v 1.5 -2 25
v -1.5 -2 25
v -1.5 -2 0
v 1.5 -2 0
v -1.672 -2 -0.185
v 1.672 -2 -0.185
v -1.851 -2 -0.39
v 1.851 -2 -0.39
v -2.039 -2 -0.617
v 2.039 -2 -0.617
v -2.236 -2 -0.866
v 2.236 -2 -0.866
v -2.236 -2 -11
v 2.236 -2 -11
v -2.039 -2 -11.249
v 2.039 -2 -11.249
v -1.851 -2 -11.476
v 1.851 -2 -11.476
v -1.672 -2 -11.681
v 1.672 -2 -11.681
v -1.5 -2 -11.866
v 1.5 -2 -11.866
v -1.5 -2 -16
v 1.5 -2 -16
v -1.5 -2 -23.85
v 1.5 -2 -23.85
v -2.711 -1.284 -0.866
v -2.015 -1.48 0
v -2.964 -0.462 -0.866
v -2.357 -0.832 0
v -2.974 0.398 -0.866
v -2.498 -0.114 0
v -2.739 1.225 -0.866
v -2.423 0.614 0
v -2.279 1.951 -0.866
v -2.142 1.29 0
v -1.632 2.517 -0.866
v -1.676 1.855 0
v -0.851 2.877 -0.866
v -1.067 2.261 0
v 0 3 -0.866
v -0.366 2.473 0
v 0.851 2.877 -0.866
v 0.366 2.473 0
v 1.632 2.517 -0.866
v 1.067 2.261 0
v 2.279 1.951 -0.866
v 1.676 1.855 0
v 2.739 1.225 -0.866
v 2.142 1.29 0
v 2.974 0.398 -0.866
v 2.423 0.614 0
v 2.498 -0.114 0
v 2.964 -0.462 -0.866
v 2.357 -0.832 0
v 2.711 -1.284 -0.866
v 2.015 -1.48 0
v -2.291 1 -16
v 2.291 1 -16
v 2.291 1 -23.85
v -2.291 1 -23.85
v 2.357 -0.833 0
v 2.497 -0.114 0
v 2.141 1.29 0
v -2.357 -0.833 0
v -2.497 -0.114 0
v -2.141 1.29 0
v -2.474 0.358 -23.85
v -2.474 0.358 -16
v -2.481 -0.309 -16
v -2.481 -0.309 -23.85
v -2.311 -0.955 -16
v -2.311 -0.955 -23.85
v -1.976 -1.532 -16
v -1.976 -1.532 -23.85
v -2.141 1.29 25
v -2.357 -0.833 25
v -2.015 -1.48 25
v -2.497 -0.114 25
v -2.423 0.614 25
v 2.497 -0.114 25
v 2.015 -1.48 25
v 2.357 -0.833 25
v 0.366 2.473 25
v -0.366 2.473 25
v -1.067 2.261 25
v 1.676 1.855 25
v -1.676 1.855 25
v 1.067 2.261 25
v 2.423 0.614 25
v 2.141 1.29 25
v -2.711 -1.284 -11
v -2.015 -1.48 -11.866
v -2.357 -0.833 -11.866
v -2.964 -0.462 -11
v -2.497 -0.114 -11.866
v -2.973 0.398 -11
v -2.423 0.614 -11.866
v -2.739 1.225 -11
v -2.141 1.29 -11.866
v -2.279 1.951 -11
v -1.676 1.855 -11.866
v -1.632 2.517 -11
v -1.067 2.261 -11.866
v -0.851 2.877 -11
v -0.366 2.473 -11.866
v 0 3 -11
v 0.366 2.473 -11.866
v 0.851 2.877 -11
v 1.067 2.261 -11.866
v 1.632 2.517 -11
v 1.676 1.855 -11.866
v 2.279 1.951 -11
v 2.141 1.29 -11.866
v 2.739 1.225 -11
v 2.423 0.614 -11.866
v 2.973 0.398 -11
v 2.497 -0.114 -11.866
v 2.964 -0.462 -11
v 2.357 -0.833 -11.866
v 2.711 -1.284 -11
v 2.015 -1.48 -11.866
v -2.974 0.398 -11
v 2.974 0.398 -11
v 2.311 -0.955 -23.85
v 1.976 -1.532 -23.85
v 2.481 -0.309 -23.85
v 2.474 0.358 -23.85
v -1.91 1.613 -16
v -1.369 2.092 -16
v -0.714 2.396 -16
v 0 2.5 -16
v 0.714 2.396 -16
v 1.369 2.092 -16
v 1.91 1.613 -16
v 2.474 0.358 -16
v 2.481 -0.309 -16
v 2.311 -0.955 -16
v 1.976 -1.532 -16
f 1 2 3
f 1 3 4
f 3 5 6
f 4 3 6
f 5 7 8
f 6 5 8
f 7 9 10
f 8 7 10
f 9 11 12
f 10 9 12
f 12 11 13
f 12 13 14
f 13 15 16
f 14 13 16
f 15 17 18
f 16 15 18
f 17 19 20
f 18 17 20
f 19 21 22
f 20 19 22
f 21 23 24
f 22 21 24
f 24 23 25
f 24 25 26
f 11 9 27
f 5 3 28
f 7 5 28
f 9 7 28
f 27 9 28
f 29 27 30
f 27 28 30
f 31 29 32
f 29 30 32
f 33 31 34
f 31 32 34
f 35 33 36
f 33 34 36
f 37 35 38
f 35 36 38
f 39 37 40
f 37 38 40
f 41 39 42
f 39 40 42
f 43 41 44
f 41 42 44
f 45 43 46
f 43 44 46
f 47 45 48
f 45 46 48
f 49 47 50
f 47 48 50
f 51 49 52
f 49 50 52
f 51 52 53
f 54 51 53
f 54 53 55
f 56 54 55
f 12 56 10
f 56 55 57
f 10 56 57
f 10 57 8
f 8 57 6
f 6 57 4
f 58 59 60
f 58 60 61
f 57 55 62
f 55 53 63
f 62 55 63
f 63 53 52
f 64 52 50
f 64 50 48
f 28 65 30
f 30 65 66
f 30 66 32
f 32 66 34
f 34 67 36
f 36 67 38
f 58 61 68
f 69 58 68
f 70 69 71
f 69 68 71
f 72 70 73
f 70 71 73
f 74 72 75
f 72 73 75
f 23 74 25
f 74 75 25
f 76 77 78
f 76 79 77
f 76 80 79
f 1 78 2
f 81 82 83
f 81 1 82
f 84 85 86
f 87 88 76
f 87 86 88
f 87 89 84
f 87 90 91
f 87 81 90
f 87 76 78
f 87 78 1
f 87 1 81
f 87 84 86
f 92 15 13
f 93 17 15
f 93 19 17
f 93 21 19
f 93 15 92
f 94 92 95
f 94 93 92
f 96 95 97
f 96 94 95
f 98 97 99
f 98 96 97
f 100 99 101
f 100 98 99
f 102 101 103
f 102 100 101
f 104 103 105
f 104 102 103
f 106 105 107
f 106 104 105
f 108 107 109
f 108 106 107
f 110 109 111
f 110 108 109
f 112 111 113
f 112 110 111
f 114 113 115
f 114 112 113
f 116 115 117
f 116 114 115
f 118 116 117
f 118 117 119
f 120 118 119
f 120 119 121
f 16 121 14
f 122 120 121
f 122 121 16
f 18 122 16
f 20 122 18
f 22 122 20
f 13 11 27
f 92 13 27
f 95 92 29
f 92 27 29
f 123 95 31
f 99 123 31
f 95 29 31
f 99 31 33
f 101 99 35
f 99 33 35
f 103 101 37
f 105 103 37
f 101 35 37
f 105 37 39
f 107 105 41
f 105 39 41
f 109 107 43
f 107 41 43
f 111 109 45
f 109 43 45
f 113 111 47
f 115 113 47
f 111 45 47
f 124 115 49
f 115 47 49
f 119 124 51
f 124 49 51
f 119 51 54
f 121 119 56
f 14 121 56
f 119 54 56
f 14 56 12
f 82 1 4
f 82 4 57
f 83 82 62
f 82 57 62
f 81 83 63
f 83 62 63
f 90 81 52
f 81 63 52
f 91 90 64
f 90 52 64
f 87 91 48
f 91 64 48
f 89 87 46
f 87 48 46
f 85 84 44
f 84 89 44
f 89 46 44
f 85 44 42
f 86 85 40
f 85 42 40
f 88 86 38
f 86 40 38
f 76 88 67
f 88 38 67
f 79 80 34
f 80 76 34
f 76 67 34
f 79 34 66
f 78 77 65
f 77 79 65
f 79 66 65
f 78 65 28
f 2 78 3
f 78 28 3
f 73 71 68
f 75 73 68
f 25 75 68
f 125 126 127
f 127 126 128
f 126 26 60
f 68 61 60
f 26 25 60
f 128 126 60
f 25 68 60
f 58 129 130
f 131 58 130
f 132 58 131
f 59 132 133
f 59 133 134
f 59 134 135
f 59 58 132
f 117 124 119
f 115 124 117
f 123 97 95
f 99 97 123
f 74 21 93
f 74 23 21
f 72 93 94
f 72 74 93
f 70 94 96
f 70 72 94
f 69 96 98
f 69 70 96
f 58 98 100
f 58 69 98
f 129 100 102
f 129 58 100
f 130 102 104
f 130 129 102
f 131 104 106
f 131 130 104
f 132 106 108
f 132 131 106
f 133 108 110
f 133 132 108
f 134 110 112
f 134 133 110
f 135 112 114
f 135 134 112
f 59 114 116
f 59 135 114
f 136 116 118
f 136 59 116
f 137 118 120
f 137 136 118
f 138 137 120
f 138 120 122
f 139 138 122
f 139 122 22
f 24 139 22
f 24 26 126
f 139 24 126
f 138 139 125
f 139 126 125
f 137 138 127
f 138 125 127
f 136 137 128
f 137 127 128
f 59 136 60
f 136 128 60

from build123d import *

# Parameters (mm, degrees)
SKETCH1_R           = 2.5
BOSS_EXTRUDE1_DEPTH = 25
SKETCH2_R           = 3
BOSS_EXTRUDE2_DEPTH = 11
CHAMFER1_SIZE2      = 0.5
CHAMFER1_SIZE       = 0.866025404
BOSS_EXTRUDE3_START = 5
SKETCH3_R           = 2.5
BOSS_EXTRUDE3_DEPTH = 5
CHAMFER3_SIZE2      = 0.866025404
CHAMFER3_SIZE       = 0.5
BOSS_EXTRUDE4_START = 7.85
BOSS_EXTRUDE4_DEPTH = 7.85


with BuildPart() as part:
    # Sketch1 → Boss-Extrude1 (new body)
    with BuildSketch(Plane.XY):
        Circle(SKETCH1_R)
    extrude(amount=BOSS_EXTRUDE1_DEPTH)

    # Sketch2 → Boss-Extrude2 (add)
    with BuildSketch(Plane(origin=(0, 0, 0), x_dir=(-1, 0, 0), z_dir=(0, 0, -1))):
        Circle(SKETCH2_R)
    extrude(amount=BOSS_EXTRUDE2_DEPTH)

    # Chamfer1
    chamfer1_edges = [part.edges().sort_by_distance(p)[0] for p in [
        (3, 0, 0),
    ]]
    chamfer1_side = [part.faces().sort_by_distance(p)[0] for p in [
        (3, 0, -0.01),
    ]]
    chamfer(chamfer1_edges, length=CHAMFER1_SIZE - 0.0001, length2=CHAMFER1_SIZE2 - 0.0001, reference=chamfer1_side[0])  # a hair under: the kernel refuses the full size

    # Sketch3 → Boss-Extrude3 (add)
    with BuildSketch(Plane(origin=(0, 0, -11), x_dir=(-1, 0, 0), z_dir=(0, 0, -1)).offset(BOSS_EXTRUDE3_START)):
        with Locations(Location((0, 0, 0), (0, 0, 180))):
            Circle(SKETCH3_R)
    extrude(amount=-BOSS_EXTRUDE3_DEPTH)

    # Chamfer3
    chamfer3_edges = [part.edges().sort_by_distance(p)[0] for p in [
        (-2.5, 0, -11),
    ]]
    chamfer3_side = [part.faces().sort_by_distance(p)[0] for p in [
        (-2.51, 0, -11),
    ]]
    chamfer(chamfer3_edges, length=CHAMFER3_SIZE - 0.0001, length2=CHAMFER3_SIZE2 - 0.0001, reference=chamfer3_side[0])  # a hair under: the kernel refuses the full size

    # Sketch4 → Boss-Extrude4 (add)
    with BuildSketch(Plane(origin=(0, 0, -16), x_dir=(-1, 0, 0), z_dir=(0, 0, -1)).offset(BOSS_EXTRUDE4_START)):
        with BuildLine():
            Line((-2.291287847, 1), (2.291287847, 1))
            ThreePointArc((2.291287847, 1), (0, -2.5), (-2.291287847, 1))
        make_face()
    extrude(amount=-BOSS_EXTRUDE4_DEPTH)

    # SurfaceCut1
    split(bisect_by=Plane(origin=(0, -2, 0), x_dir=(1, 0, 0), z_dir=(0, 1, 0)), keep=Keep.TOP)


solid = part.part
